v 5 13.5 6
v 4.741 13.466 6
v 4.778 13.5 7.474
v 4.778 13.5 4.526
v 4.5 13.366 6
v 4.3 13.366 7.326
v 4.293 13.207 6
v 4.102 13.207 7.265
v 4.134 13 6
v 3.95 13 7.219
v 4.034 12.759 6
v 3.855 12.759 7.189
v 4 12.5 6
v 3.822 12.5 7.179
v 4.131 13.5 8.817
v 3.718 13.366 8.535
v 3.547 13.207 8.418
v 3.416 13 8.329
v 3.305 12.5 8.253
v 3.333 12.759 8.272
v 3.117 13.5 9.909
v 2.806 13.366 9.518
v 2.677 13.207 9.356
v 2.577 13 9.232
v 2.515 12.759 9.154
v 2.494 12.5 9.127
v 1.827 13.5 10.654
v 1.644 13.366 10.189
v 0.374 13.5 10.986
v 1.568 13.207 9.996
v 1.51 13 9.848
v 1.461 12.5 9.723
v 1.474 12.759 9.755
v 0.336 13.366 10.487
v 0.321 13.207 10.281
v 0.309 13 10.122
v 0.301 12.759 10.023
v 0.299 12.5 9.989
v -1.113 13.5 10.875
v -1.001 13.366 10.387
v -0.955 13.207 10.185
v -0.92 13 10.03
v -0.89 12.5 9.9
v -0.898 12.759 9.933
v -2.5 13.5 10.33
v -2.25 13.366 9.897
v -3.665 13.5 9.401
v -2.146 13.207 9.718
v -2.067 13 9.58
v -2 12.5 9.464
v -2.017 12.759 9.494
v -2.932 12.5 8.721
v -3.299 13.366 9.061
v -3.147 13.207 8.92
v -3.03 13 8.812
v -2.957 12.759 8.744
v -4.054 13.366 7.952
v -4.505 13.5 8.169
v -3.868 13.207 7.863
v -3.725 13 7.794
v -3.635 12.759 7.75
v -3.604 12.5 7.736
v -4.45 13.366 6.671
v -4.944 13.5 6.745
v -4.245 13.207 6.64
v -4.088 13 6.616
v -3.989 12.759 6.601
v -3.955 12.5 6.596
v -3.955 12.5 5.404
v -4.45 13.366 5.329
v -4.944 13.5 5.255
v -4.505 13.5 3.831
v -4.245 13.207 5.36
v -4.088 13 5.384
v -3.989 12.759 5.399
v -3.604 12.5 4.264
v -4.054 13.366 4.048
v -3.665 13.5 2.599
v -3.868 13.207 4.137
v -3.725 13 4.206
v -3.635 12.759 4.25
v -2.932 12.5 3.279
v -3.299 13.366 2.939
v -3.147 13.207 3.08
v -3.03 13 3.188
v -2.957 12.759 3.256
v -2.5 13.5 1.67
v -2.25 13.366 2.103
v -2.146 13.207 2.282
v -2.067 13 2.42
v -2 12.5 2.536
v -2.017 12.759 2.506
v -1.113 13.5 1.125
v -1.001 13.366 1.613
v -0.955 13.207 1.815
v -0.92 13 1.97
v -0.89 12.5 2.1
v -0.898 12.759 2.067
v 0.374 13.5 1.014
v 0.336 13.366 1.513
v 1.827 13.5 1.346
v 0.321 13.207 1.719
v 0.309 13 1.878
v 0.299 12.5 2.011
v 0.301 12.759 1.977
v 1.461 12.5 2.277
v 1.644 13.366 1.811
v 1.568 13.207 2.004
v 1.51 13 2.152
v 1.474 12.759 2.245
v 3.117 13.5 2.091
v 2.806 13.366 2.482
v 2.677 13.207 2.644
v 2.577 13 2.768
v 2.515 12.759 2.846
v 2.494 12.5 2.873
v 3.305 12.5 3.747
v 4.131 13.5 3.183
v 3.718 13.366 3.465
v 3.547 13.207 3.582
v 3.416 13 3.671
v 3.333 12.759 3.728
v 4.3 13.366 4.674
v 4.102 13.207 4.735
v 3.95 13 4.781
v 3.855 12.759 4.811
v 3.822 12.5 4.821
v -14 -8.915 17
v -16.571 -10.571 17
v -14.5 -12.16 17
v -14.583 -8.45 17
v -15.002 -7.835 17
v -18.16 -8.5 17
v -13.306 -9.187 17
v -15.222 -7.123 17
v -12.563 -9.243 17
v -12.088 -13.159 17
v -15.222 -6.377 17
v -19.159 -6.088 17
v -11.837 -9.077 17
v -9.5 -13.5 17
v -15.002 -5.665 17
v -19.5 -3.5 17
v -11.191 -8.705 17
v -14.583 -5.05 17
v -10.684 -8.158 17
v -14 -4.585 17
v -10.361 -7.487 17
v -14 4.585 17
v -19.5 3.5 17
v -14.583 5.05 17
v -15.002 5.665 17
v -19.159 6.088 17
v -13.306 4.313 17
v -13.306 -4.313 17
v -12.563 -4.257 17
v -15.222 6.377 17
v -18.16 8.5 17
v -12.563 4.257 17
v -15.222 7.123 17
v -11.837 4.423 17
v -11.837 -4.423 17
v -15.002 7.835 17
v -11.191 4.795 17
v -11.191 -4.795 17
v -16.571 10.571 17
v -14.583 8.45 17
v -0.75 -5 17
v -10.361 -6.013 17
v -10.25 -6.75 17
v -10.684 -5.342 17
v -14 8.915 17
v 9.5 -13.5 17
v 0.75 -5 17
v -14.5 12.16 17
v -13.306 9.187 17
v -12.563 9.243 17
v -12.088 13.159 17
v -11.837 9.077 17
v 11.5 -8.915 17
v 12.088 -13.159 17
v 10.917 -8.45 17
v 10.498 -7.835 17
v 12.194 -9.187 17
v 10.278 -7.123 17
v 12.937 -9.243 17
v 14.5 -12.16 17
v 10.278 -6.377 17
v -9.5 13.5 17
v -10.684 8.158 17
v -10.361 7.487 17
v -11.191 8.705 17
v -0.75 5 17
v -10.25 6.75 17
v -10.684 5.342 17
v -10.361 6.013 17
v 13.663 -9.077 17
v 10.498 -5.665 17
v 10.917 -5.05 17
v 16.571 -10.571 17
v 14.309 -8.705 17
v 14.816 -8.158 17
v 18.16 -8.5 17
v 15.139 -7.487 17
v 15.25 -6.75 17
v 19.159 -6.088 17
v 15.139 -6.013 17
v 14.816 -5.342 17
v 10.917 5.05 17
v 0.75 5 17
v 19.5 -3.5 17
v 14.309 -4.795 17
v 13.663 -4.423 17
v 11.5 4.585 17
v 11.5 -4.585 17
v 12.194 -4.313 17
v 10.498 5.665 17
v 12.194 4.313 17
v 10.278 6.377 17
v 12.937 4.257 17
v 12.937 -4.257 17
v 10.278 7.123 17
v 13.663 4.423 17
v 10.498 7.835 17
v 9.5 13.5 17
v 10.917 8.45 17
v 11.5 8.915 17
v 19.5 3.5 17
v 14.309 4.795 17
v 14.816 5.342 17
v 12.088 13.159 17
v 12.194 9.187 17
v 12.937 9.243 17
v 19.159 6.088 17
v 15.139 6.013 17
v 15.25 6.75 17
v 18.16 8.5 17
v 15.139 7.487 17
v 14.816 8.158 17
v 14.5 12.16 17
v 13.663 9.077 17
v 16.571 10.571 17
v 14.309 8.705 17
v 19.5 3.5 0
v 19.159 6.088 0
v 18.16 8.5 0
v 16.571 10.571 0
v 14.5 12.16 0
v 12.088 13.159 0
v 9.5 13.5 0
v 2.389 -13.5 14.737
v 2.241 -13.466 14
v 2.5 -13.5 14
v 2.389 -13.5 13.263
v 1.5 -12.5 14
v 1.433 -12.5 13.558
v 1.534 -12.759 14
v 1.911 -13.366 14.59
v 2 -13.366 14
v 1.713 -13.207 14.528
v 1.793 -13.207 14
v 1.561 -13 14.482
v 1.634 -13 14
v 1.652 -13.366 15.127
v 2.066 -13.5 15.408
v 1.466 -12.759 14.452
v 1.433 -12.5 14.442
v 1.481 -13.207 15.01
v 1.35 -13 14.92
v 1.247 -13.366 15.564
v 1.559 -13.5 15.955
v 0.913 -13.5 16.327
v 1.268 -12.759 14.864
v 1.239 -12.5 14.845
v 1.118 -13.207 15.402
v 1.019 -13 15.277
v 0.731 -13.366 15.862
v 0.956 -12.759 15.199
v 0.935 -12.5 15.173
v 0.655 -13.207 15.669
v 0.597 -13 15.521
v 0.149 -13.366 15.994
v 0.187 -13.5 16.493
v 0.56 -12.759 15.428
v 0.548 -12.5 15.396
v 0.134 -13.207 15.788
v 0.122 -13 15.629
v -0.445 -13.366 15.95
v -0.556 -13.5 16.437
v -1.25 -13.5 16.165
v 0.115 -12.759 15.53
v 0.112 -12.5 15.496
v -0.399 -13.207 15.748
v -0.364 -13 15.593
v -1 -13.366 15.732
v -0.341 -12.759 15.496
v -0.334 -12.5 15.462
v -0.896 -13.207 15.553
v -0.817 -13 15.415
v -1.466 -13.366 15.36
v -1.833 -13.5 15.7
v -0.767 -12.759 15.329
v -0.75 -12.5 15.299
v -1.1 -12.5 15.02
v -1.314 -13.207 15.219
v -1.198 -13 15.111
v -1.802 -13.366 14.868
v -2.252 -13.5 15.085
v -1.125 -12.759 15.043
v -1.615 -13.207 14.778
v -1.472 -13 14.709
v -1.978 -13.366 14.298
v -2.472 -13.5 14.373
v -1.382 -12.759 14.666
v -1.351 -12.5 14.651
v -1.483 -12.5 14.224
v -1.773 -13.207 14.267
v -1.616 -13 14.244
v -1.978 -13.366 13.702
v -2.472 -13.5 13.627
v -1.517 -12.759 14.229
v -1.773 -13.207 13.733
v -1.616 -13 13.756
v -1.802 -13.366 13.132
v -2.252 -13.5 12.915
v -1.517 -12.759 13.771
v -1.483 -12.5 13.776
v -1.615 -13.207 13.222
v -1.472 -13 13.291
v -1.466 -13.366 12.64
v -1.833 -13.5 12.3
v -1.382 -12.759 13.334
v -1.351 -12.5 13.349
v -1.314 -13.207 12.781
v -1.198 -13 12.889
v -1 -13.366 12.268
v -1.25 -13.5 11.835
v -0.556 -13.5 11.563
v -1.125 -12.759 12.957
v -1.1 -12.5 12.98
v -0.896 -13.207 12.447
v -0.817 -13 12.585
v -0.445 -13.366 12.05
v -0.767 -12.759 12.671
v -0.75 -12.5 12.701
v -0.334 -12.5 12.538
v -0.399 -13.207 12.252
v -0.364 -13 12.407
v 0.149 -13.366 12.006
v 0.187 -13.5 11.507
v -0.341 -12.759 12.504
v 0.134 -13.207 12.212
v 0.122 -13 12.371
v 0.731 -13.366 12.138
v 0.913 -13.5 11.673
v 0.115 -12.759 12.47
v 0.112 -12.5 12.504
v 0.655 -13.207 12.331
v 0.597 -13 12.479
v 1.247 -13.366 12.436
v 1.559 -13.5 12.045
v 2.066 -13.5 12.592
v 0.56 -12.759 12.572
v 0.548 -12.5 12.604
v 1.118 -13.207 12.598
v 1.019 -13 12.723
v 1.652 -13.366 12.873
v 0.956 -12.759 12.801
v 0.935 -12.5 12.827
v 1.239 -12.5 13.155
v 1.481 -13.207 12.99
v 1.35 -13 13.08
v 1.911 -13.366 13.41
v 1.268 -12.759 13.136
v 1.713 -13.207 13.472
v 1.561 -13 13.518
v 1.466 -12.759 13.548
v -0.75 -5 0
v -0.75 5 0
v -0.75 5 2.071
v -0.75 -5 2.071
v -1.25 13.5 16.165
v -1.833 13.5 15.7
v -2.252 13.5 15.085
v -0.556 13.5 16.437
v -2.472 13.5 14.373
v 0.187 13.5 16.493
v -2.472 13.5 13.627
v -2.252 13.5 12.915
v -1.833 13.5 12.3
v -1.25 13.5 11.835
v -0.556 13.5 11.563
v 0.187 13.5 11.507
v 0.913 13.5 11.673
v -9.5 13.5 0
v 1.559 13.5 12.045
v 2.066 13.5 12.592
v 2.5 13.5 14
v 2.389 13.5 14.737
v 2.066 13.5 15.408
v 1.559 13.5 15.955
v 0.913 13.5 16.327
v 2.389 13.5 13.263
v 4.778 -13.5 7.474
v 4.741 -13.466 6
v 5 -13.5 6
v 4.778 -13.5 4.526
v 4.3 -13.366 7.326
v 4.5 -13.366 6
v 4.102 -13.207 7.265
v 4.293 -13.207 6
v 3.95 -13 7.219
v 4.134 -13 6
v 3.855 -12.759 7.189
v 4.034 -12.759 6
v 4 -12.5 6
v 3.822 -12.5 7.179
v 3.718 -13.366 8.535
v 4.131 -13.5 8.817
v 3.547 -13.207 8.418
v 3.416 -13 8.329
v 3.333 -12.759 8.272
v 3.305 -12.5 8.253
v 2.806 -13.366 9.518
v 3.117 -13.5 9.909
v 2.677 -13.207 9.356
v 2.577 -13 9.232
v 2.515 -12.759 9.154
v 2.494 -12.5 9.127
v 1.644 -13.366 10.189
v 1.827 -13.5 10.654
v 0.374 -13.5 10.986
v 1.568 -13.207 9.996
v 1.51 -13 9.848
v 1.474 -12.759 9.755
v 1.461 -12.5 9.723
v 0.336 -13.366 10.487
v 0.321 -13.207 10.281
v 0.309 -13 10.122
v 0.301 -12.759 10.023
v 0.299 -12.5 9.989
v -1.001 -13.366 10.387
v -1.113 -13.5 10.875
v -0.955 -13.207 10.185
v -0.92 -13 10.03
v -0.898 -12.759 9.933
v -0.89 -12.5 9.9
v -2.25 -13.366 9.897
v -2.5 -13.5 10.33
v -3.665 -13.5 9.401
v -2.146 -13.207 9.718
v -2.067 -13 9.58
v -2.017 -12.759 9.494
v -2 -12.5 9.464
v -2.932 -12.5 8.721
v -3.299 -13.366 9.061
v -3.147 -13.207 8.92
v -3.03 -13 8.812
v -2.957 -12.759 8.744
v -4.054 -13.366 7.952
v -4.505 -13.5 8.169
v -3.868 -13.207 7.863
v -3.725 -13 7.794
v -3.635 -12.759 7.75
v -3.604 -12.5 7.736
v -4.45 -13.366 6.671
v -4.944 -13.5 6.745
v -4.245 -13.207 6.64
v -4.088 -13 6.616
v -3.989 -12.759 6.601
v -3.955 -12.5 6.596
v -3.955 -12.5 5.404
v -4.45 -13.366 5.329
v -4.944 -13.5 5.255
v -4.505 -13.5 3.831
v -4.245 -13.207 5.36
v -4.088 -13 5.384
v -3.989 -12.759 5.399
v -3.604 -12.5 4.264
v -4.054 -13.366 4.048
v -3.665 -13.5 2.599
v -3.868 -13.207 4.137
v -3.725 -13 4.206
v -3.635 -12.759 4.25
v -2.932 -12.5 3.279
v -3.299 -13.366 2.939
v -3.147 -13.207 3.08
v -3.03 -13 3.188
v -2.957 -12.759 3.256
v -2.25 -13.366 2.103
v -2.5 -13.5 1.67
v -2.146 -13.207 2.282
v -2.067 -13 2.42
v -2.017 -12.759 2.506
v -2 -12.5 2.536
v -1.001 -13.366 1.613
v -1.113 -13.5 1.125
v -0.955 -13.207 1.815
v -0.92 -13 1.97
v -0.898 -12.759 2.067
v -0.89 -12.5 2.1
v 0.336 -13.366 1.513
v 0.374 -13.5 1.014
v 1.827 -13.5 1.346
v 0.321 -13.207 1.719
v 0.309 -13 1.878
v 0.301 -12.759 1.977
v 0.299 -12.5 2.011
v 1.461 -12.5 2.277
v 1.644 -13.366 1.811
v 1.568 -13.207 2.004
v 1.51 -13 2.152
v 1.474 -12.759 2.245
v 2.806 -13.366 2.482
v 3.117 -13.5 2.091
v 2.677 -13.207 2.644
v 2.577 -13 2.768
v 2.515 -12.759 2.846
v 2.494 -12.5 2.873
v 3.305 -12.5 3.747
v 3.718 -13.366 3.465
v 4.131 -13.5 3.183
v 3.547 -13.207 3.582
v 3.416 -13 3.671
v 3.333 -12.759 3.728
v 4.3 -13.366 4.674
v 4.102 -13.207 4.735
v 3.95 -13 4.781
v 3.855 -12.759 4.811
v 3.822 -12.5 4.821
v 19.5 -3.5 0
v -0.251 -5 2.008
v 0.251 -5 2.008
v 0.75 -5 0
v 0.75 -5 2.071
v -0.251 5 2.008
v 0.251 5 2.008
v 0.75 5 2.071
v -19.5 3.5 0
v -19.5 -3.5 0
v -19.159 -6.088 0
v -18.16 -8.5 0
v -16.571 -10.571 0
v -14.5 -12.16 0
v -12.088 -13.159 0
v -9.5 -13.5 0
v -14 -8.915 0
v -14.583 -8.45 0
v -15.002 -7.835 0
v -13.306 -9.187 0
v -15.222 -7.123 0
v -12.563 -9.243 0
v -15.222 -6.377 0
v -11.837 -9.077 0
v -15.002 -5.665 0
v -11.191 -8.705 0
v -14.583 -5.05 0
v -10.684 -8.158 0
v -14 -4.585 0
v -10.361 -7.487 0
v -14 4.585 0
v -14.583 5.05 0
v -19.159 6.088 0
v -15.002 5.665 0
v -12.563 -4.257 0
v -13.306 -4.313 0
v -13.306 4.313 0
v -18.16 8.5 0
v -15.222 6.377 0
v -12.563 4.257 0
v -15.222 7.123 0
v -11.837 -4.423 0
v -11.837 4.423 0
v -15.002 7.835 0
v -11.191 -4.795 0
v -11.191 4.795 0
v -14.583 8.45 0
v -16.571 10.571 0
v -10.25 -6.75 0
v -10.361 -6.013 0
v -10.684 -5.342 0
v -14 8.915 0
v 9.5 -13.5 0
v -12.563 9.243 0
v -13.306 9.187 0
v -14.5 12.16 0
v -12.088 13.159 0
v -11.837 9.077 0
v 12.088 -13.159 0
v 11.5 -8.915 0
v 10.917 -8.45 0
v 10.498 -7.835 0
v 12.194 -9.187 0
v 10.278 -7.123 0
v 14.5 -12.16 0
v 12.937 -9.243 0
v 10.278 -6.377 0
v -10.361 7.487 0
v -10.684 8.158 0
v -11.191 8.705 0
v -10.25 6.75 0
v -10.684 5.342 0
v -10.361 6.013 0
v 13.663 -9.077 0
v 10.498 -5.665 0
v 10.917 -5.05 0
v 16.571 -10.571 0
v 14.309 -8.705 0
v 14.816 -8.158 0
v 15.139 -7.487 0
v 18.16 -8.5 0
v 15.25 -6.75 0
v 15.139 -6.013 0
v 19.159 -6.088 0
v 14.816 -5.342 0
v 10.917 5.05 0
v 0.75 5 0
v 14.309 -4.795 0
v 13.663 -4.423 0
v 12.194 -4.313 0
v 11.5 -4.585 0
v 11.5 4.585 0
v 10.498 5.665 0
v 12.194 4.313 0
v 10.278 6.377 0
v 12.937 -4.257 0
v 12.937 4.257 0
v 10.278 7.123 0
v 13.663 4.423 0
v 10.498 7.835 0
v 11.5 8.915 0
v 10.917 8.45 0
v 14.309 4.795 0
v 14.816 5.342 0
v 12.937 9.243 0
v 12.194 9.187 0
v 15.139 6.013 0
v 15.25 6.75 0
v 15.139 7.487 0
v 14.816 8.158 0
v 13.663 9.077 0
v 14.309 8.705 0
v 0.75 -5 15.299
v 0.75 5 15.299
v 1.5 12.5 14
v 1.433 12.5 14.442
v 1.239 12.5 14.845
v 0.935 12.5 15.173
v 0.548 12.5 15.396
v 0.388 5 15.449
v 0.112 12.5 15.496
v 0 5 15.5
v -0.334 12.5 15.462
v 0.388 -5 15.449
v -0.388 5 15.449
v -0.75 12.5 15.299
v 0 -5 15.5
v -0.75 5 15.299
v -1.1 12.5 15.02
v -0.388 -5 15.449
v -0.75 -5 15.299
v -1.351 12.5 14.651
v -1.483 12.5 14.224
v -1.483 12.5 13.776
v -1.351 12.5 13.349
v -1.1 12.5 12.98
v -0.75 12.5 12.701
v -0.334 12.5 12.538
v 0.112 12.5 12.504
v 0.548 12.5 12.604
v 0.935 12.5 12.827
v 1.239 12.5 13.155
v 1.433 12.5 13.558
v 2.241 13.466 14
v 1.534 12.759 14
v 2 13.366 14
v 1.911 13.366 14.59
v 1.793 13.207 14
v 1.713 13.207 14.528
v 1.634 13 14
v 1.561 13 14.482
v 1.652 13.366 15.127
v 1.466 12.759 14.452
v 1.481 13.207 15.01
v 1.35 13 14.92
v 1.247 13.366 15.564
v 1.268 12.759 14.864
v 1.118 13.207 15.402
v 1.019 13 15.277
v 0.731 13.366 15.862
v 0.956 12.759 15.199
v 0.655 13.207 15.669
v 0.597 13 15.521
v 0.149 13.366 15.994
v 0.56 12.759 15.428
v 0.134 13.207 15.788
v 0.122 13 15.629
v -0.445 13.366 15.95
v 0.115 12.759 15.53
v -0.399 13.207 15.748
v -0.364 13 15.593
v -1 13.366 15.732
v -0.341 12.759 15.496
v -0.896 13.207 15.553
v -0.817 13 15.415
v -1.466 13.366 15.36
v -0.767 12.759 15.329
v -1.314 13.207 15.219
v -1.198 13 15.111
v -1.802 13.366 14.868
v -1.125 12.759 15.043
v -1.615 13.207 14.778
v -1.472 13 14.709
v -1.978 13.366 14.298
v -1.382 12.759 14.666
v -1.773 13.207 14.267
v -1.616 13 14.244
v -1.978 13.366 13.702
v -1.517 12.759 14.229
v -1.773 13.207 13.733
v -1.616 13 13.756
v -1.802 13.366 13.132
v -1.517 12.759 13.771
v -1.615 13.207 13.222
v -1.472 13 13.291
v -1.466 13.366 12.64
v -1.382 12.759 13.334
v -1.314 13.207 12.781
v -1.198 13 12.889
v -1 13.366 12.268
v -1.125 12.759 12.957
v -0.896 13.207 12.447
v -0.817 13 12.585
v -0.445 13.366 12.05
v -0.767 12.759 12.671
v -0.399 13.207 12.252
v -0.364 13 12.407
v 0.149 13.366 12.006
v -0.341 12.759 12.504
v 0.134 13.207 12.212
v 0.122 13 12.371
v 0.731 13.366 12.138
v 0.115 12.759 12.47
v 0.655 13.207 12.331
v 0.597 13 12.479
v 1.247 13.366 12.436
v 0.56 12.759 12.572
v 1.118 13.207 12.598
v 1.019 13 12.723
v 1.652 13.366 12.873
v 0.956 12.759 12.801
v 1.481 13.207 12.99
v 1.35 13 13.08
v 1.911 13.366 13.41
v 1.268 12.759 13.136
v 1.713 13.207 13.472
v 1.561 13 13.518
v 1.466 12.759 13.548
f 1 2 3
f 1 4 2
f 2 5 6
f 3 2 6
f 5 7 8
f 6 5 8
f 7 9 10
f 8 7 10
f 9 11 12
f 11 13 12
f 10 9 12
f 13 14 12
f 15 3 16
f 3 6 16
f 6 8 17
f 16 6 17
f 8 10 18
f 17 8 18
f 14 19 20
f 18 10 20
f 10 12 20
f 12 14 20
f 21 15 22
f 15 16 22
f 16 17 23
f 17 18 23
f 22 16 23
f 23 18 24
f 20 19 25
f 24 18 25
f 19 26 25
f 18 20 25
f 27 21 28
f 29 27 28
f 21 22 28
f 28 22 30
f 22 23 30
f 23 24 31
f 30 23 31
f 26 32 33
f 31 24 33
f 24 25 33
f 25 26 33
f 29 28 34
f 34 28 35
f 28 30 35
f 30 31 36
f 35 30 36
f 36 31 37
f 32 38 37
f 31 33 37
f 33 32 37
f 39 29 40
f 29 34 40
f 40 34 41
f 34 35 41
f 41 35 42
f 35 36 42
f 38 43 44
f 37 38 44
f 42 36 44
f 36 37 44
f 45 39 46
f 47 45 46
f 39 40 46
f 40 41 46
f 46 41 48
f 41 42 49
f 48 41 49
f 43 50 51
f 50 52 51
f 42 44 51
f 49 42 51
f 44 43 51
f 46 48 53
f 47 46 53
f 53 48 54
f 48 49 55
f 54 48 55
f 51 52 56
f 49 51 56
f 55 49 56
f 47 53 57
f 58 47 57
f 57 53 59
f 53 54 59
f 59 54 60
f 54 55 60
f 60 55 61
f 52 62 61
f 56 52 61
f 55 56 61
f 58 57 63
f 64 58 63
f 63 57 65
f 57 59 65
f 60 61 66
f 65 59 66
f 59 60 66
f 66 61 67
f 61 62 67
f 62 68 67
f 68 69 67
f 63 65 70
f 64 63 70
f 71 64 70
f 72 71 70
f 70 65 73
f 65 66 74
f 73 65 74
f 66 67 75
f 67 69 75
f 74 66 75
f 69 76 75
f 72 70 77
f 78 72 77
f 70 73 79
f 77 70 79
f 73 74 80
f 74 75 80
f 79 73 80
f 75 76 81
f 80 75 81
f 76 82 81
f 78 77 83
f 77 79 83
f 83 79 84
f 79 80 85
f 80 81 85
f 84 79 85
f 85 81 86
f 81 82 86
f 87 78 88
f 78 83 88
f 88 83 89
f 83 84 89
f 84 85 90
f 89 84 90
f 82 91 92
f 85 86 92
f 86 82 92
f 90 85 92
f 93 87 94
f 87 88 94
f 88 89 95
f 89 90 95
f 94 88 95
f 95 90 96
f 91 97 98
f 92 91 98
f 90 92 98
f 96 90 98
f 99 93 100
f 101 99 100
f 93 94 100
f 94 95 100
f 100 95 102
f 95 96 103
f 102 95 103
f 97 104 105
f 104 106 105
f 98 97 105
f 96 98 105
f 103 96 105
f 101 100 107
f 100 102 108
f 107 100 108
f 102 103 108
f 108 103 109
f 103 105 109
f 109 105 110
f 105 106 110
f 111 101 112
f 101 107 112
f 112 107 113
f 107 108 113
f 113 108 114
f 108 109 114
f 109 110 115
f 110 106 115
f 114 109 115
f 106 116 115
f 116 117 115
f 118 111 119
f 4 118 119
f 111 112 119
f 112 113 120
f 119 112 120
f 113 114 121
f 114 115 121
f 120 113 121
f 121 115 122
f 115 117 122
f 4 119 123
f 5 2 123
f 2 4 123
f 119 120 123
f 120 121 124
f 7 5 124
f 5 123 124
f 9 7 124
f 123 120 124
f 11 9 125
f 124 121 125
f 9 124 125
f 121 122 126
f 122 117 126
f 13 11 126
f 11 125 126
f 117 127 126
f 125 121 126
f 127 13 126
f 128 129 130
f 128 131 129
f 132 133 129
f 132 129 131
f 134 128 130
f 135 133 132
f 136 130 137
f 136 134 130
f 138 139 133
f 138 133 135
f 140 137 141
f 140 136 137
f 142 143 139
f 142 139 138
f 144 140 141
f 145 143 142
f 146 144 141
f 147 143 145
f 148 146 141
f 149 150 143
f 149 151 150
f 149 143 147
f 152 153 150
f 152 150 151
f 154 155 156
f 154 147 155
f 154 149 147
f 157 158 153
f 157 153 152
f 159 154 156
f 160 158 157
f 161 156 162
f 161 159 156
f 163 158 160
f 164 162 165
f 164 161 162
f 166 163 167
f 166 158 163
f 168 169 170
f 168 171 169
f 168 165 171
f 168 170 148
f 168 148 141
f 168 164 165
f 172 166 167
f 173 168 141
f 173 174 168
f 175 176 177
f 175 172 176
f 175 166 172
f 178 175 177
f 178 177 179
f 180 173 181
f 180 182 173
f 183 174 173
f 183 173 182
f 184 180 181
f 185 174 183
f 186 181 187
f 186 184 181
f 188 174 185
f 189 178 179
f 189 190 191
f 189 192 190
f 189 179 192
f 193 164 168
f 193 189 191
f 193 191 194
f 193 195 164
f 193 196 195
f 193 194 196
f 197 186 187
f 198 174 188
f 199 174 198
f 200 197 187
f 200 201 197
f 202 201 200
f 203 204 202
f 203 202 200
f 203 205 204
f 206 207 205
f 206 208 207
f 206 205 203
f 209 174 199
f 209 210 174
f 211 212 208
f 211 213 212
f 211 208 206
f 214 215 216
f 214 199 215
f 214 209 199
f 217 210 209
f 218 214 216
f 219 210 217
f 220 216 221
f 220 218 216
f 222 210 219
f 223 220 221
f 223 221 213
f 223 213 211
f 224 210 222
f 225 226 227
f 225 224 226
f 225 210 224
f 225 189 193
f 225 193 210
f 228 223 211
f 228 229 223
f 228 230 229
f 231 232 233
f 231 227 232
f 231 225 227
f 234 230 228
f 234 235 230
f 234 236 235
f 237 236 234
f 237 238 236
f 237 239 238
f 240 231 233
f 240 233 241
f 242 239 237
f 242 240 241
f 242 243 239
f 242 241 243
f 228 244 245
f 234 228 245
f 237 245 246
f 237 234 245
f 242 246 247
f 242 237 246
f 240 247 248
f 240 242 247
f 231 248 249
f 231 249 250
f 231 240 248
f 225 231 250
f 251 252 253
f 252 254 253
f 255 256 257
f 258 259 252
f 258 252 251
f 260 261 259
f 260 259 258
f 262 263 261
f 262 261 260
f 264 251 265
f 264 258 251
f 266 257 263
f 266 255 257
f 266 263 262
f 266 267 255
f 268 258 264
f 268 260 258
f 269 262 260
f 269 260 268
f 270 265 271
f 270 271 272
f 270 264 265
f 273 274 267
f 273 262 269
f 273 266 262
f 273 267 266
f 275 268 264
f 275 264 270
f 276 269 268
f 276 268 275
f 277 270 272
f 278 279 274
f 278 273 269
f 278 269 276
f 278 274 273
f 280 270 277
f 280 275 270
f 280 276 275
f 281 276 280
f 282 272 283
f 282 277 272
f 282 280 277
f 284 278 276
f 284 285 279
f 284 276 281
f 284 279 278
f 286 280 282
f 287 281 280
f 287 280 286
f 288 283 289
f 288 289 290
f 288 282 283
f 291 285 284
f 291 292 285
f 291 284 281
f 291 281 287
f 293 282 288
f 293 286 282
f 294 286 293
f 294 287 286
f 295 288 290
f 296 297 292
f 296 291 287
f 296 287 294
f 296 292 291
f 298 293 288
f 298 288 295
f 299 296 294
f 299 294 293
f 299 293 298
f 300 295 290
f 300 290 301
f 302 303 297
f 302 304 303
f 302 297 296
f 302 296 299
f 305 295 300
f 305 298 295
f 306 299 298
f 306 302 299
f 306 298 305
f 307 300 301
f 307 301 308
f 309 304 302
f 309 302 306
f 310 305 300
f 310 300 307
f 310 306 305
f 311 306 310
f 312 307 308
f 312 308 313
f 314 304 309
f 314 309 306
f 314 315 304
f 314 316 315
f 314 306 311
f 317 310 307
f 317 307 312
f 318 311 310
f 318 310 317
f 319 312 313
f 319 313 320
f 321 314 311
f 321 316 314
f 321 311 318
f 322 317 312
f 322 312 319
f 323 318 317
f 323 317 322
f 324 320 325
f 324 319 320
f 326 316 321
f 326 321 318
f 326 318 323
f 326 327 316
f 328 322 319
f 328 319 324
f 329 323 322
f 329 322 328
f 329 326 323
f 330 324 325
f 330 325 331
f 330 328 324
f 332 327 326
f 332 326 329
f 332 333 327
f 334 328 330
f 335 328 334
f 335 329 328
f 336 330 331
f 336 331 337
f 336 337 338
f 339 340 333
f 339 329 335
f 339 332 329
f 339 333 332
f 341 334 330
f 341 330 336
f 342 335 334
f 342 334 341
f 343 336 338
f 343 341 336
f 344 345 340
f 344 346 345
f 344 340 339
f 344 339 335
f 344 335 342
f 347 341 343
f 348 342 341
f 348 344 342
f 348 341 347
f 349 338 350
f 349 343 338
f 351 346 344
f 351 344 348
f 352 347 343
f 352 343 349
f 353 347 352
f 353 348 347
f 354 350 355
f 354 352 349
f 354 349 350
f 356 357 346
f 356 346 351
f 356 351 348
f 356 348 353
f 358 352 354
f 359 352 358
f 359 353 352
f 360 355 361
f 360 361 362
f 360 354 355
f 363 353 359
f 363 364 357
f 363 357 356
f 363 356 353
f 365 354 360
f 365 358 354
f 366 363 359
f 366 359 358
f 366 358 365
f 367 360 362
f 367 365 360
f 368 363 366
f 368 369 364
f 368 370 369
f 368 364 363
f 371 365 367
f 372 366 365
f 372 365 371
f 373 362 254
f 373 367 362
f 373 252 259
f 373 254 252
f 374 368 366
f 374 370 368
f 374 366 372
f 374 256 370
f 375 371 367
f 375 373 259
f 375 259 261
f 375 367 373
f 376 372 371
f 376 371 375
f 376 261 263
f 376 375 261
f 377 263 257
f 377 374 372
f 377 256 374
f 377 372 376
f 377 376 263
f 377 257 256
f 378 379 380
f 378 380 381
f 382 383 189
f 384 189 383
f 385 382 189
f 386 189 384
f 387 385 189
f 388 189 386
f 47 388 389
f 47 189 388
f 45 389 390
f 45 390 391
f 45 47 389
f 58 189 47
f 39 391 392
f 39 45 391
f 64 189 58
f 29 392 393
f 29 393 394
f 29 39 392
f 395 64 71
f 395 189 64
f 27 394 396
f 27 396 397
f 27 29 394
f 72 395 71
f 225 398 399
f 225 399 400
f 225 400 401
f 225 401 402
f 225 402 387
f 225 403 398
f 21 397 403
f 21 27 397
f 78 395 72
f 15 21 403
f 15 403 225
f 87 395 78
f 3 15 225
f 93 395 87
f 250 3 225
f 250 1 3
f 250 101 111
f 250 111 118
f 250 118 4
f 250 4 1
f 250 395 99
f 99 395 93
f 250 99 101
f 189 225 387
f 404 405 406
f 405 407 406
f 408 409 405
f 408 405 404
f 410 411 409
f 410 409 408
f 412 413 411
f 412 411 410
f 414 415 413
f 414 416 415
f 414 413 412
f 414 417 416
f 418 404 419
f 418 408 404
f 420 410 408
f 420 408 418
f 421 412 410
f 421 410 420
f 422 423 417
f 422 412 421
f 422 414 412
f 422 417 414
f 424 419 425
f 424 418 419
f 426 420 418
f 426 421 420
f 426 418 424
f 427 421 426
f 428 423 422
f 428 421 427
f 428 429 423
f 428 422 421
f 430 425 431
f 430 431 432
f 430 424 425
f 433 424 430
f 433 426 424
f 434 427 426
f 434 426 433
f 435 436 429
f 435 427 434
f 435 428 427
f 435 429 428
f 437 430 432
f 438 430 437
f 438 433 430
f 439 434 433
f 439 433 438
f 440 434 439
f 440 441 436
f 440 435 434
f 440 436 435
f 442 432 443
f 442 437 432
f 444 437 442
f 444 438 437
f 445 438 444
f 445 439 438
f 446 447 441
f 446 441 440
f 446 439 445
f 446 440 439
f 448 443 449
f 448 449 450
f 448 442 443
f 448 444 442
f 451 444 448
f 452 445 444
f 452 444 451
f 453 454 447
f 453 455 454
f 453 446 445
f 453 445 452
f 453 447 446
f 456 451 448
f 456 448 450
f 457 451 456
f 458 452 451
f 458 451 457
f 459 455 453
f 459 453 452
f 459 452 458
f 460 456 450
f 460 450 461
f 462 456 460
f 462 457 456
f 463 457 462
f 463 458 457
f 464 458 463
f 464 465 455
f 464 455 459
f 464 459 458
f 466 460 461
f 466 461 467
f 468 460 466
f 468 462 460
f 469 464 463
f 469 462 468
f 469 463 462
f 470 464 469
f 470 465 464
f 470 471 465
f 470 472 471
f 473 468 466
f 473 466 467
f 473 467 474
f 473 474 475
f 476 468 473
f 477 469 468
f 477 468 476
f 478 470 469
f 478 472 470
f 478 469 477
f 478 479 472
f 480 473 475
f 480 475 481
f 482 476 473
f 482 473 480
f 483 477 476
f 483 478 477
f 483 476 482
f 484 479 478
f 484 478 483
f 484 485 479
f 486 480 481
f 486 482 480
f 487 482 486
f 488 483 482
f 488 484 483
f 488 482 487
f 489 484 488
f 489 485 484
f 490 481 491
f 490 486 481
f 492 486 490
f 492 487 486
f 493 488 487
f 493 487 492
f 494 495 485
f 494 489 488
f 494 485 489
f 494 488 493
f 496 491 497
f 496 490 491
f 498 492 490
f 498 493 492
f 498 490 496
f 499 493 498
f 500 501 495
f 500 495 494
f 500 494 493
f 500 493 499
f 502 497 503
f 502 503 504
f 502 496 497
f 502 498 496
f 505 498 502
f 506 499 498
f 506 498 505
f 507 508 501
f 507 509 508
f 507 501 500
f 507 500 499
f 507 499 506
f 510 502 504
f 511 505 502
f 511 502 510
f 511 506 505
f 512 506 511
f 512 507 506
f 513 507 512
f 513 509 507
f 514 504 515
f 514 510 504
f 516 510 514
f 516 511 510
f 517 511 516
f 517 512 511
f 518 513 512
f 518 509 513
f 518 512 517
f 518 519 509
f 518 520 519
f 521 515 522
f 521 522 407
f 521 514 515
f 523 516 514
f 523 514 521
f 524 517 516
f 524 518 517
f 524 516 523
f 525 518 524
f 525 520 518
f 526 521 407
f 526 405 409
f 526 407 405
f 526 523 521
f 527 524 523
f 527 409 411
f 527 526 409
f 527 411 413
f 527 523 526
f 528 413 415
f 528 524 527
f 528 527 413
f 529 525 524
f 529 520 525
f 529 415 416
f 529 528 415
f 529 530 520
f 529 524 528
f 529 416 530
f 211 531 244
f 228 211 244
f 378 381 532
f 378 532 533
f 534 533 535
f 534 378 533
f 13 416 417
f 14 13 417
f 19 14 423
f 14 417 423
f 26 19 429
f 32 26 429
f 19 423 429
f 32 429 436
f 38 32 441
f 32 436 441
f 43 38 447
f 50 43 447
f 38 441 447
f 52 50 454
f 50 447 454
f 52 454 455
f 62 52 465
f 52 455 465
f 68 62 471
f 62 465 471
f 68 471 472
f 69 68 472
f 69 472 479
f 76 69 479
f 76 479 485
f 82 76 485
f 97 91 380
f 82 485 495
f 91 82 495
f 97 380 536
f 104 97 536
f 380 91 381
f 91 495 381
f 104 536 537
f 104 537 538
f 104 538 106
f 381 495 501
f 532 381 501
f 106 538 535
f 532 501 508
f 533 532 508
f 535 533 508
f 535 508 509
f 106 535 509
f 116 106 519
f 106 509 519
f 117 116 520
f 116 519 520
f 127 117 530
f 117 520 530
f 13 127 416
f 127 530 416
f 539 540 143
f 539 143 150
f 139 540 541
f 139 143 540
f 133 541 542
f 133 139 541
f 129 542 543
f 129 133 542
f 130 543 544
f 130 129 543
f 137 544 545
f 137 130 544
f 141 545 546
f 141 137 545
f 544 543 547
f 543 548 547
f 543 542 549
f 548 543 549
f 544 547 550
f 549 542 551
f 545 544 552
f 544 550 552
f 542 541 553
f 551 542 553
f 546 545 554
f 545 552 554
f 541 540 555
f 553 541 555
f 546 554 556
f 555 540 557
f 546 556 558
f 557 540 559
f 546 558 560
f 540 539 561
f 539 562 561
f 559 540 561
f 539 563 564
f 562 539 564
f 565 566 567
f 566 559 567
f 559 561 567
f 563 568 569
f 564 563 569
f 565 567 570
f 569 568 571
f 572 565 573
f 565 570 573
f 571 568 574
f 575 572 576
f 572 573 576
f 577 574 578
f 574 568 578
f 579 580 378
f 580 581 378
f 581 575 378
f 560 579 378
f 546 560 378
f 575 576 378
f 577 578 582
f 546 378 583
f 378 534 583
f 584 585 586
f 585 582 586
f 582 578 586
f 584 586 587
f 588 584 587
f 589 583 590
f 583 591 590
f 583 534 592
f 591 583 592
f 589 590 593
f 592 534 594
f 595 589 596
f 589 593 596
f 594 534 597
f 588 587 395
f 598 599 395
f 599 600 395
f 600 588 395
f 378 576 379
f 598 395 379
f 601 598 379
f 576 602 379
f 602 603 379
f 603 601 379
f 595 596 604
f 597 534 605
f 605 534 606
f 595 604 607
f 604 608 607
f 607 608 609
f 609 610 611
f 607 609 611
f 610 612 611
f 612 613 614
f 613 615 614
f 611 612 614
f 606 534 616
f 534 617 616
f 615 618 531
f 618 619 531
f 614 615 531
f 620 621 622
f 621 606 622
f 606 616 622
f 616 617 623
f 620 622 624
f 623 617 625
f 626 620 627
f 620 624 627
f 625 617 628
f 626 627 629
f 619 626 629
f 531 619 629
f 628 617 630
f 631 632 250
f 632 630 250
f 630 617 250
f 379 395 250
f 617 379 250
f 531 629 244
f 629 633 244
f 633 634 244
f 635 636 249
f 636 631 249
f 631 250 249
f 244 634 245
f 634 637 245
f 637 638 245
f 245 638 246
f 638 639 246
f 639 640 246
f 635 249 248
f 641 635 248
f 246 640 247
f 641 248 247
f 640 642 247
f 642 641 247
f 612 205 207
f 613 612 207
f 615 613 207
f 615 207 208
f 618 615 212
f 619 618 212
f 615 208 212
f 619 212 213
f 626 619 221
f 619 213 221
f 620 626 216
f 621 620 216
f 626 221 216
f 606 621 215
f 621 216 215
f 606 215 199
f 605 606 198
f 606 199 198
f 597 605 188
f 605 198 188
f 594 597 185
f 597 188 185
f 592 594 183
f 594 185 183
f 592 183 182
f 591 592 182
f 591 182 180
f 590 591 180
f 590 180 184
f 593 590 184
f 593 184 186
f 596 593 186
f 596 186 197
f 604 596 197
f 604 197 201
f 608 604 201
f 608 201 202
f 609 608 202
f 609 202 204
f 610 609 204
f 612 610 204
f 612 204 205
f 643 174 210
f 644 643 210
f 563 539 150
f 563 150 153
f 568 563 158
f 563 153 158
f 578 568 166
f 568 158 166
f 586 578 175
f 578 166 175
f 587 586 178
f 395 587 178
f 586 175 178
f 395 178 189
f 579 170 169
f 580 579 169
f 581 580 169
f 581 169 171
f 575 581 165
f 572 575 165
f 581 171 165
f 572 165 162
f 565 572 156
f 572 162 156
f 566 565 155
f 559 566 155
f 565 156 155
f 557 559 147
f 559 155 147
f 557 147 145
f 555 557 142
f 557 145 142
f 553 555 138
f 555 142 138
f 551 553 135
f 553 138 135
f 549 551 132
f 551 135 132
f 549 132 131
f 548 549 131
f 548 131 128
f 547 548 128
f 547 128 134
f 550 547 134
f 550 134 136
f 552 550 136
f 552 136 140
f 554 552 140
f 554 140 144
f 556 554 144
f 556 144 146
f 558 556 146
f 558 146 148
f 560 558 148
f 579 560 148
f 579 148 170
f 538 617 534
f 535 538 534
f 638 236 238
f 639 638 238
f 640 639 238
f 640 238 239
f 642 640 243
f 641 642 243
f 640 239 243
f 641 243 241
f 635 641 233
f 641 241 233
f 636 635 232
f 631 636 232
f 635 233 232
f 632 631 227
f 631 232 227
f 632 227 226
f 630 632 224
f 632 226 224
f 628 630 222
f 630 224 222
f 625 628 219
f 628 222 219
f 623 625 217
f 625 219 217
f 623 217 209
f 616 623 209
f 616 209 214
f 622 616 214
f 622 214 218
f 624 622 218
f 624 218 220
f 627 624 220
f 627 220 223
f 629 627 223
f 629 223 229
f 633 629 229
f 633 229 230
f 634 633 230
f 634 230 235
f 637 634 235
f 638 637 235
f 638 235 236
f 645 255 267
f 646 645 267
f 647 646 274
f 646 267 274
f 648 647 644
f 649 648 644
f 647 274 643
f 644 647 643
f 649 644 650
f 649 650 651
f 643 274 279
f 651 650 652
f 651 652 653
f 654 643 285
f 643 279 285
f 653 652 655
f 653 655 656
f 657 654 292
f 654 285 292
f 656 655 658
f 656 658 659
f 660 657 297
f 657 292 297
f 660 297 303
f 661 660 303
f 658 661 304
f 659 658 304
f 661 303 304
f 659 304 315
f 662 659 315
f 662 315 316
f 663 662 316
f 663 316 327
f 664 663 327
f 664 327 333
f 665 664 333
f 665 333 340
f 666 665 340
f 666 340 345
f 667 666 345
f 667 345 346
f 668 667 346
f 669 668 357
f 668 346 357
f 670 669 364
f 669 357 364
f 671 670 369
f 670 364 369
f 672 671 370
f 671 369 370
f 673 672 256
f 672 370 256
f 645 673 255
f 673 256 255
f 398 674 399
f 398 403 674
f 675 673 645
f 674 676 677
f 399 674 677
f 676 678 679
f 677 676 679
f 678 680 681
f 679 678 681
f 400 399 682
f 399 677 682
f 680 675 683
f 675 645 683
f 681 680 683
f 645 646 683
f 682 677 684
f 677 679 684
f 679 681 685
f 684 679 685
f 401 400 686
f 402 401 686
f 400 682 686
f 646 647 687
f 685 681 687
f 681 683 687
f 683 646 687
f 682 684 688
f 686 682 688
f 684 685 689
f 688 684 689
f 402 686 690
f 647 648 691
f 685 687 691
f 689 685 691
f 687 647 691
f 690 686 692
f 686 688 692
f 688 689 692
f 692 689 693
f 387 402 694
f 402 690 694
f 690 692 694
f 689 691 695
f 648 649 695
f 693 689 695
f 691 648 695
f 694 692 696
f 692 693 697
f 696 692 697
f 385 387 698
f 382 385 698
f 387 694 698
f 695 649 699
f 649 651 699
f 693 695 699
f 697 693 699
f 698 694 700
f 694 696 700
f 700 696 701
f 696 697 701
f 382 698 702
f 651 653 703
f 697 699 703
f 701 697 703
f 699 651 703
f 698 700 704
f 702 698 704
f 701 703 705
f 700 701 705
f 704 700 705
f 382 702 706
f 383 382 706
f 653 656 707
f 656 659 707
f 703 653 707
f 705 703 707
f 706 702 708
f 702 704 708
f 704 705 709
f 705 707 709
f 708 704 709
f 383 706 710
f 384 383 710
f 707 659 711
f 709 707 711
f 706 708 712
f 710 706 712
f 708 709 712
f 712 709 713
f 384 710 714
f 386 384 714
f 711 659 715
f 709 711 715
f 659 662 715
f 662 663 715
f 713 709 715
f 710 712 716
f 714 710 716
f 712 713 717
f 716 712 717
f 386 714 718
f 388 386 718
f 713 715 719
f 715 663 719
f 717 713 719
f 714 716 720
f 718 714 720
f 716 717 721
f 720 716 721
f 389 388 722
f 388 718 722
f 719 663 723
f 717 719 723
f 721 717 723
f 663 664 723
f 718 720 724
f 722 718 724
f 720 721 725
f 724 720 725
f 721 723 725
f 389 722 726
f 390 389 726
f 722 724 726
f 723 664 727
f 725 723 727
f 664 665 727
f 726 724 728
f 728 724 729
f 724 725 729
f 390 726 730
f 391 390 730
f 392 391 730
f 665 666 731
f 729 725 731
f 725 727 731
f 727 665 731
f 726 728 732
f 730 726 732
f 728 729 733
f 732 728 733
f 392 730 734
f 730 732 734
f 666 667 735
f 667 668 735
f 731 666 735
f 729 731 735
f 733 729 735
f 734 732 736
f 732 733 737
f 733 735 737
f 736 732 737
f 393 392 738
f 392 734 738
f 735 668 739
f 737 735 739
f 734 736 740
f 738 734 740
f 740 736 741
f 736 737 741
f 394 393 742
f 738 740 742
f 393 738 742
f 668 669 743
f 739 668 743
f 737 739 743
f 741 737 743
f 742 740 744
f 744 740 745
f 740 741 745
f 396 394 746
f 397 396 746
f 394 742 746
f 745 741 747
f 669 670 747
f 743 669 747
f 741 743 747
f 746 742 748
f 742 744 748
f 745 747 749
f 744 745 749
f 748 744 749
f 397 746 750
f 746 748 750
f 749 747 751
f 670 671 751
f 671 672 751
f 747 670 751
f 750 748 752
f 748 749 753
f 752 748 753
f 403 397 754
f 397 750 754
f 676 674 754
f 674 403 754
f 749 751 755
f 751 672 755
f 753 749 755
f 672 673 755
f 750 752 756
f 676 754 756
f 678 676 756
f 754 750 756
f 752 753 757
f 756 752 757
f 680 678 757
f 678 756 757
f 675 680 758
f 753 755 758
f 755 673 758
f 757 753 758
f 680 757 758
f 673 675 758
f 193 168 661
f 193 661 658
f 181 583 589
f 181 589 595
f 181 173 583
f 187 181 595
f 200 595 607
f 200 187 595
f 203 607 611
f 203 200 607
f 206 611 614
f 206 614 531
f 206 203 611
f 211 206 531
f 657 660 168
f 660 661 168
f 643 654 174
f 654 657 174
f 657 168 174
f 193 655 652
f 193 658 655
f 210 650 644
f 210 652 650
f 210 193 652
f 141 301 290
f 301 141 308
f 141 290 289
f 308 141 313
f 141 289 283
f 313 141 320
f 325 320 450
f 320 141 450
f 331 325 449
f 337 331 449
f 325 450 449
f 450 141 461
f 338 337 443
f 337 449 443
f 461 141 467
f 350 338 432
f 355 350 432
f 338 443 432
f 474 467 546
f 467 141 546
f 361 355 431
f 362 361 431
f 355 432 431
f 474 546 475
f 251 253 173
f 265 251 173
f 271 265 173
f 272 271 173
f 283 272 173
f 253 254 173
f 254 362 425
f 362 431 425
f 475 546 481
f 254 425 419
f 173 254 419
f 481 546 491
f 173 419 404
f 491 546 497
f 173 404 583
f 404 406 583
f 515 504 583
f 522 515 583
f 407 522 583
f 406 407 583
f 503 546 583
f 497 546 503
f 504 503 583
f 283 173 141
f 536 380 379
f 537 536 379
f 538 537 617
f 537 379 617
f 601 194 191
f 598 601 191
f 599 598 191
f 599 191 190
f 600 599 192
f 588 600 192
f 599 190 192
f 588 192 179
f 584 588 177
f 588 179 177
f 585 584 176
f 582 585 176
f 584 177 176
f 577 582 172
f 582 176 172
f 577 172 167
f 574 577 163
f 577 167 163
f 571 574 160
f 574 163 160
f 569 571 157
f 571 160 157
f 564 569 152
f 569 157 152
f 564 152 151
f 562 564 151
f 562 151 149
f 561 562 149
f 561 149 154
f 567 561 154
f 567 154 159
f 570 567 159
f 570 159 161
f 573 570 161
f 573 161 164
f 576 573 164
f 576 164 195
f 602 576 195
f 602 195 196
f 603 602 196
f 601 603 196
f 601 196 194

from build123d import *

# Parameters (mm, degrees)
F0_W      = 39
F0_H      = 27
F1_DEPTH  = 17
F2_R      = 10
F3_R      = 2.5
F4_DEPTH  = 17.001
F5_R      = 1.5
F6_DEPTH  = 27.001
F7_W      = 1.5
F7_H      = 10
F8_DEPTH  = 1.7019618943
F9_R      = 4
F10_DEPTH = 27.001
F11_R     = 1
F12_W     = 1.5
F12_H     = 10
F13_DEPTH = 2.0719415886


with BuildPart() as f1:
    # F0 (on Top) → F1 (new body)
    with BuildSketch(Plane.XY):
        Rectangle(F0_W, F0_H)
    extrude(amount=F1_DEPTH)

    # F2
    f2_edges = [f1.edges().sort_by_distance(p)[0] for p in [
        (19.5, 13.5, 8.5),
        (-19.5, 13.5, 8.5),
        (-19.5, -13.5, 8.5),
        (19.5, -13.5, 8.5),
    ]]
    fillet(f2_edges, radius=F2_R)

    # F3 (on face) → F4 (cut, through all)
    with BuildSketch(Plane.XY.offset(17)):
        with Locations((-12.75, -6.75)):
            Circle(F3_R)
        with Locations((12.75, 6.75)):
            Circle(F3_R)
        with Locations((12.75, -6.75)):
            Circle(F3_R)
        with Locations((-12.75, 6.75)):
            Circle(F3_R)
    extrude(amount=-F4_DEPTH, mode=Mode.SUBTRACT)

    # F5 (on face) → F6 (cut, through all)
    with BuildSketch(Plane.XZ.offset(13.5)):
        with Locations((0, 14)):
            Circle(F5_R)
    extrude(amount=-F6_DEPTH, mode=Mode.SUBTRACT)

    # F7 (on face) → F8 (cut, through all)
    with BuildSketch(Plane.XY.offset(17)):
        Rectangle(F7_W, F7_H)
    extrude(amount=-F8_DEPTH, mode=Mode.SUBTRACT)

    # F9 (on face) → F10 (cut, through all)
    with BuildSketch(Plane.XZ.offset(13.5)):
        with Locations((0, 6)):
            Circle(F9_R)
    extrude(amount=-F10_DEPTH, mode=Mode.SUBTRACT)

    # F11
    f11_edges = [f1.edges().sort_by_distance(p)[0] for p in [
        (-1.5, -13.5, 14),
        (-1.5, 13.5, 14),
        (-4, -13.5, 6),
        (-4, 13.5, 6),
    ]]
    fillet(f11_edges, radius=F11_R)

    # F12 (on face) → F13 (cut, through all)
    with BuildSketch(Plane(origin=(0, 0, 0), x_dir=(1, 0, 0), z_dir=(0, 0, -1))):
        Rectangle(F12_W, F12_H)
    extrude(amount=-F13_DEPTH, mode=Mode.SUBTRACT)


solid = f1.part
